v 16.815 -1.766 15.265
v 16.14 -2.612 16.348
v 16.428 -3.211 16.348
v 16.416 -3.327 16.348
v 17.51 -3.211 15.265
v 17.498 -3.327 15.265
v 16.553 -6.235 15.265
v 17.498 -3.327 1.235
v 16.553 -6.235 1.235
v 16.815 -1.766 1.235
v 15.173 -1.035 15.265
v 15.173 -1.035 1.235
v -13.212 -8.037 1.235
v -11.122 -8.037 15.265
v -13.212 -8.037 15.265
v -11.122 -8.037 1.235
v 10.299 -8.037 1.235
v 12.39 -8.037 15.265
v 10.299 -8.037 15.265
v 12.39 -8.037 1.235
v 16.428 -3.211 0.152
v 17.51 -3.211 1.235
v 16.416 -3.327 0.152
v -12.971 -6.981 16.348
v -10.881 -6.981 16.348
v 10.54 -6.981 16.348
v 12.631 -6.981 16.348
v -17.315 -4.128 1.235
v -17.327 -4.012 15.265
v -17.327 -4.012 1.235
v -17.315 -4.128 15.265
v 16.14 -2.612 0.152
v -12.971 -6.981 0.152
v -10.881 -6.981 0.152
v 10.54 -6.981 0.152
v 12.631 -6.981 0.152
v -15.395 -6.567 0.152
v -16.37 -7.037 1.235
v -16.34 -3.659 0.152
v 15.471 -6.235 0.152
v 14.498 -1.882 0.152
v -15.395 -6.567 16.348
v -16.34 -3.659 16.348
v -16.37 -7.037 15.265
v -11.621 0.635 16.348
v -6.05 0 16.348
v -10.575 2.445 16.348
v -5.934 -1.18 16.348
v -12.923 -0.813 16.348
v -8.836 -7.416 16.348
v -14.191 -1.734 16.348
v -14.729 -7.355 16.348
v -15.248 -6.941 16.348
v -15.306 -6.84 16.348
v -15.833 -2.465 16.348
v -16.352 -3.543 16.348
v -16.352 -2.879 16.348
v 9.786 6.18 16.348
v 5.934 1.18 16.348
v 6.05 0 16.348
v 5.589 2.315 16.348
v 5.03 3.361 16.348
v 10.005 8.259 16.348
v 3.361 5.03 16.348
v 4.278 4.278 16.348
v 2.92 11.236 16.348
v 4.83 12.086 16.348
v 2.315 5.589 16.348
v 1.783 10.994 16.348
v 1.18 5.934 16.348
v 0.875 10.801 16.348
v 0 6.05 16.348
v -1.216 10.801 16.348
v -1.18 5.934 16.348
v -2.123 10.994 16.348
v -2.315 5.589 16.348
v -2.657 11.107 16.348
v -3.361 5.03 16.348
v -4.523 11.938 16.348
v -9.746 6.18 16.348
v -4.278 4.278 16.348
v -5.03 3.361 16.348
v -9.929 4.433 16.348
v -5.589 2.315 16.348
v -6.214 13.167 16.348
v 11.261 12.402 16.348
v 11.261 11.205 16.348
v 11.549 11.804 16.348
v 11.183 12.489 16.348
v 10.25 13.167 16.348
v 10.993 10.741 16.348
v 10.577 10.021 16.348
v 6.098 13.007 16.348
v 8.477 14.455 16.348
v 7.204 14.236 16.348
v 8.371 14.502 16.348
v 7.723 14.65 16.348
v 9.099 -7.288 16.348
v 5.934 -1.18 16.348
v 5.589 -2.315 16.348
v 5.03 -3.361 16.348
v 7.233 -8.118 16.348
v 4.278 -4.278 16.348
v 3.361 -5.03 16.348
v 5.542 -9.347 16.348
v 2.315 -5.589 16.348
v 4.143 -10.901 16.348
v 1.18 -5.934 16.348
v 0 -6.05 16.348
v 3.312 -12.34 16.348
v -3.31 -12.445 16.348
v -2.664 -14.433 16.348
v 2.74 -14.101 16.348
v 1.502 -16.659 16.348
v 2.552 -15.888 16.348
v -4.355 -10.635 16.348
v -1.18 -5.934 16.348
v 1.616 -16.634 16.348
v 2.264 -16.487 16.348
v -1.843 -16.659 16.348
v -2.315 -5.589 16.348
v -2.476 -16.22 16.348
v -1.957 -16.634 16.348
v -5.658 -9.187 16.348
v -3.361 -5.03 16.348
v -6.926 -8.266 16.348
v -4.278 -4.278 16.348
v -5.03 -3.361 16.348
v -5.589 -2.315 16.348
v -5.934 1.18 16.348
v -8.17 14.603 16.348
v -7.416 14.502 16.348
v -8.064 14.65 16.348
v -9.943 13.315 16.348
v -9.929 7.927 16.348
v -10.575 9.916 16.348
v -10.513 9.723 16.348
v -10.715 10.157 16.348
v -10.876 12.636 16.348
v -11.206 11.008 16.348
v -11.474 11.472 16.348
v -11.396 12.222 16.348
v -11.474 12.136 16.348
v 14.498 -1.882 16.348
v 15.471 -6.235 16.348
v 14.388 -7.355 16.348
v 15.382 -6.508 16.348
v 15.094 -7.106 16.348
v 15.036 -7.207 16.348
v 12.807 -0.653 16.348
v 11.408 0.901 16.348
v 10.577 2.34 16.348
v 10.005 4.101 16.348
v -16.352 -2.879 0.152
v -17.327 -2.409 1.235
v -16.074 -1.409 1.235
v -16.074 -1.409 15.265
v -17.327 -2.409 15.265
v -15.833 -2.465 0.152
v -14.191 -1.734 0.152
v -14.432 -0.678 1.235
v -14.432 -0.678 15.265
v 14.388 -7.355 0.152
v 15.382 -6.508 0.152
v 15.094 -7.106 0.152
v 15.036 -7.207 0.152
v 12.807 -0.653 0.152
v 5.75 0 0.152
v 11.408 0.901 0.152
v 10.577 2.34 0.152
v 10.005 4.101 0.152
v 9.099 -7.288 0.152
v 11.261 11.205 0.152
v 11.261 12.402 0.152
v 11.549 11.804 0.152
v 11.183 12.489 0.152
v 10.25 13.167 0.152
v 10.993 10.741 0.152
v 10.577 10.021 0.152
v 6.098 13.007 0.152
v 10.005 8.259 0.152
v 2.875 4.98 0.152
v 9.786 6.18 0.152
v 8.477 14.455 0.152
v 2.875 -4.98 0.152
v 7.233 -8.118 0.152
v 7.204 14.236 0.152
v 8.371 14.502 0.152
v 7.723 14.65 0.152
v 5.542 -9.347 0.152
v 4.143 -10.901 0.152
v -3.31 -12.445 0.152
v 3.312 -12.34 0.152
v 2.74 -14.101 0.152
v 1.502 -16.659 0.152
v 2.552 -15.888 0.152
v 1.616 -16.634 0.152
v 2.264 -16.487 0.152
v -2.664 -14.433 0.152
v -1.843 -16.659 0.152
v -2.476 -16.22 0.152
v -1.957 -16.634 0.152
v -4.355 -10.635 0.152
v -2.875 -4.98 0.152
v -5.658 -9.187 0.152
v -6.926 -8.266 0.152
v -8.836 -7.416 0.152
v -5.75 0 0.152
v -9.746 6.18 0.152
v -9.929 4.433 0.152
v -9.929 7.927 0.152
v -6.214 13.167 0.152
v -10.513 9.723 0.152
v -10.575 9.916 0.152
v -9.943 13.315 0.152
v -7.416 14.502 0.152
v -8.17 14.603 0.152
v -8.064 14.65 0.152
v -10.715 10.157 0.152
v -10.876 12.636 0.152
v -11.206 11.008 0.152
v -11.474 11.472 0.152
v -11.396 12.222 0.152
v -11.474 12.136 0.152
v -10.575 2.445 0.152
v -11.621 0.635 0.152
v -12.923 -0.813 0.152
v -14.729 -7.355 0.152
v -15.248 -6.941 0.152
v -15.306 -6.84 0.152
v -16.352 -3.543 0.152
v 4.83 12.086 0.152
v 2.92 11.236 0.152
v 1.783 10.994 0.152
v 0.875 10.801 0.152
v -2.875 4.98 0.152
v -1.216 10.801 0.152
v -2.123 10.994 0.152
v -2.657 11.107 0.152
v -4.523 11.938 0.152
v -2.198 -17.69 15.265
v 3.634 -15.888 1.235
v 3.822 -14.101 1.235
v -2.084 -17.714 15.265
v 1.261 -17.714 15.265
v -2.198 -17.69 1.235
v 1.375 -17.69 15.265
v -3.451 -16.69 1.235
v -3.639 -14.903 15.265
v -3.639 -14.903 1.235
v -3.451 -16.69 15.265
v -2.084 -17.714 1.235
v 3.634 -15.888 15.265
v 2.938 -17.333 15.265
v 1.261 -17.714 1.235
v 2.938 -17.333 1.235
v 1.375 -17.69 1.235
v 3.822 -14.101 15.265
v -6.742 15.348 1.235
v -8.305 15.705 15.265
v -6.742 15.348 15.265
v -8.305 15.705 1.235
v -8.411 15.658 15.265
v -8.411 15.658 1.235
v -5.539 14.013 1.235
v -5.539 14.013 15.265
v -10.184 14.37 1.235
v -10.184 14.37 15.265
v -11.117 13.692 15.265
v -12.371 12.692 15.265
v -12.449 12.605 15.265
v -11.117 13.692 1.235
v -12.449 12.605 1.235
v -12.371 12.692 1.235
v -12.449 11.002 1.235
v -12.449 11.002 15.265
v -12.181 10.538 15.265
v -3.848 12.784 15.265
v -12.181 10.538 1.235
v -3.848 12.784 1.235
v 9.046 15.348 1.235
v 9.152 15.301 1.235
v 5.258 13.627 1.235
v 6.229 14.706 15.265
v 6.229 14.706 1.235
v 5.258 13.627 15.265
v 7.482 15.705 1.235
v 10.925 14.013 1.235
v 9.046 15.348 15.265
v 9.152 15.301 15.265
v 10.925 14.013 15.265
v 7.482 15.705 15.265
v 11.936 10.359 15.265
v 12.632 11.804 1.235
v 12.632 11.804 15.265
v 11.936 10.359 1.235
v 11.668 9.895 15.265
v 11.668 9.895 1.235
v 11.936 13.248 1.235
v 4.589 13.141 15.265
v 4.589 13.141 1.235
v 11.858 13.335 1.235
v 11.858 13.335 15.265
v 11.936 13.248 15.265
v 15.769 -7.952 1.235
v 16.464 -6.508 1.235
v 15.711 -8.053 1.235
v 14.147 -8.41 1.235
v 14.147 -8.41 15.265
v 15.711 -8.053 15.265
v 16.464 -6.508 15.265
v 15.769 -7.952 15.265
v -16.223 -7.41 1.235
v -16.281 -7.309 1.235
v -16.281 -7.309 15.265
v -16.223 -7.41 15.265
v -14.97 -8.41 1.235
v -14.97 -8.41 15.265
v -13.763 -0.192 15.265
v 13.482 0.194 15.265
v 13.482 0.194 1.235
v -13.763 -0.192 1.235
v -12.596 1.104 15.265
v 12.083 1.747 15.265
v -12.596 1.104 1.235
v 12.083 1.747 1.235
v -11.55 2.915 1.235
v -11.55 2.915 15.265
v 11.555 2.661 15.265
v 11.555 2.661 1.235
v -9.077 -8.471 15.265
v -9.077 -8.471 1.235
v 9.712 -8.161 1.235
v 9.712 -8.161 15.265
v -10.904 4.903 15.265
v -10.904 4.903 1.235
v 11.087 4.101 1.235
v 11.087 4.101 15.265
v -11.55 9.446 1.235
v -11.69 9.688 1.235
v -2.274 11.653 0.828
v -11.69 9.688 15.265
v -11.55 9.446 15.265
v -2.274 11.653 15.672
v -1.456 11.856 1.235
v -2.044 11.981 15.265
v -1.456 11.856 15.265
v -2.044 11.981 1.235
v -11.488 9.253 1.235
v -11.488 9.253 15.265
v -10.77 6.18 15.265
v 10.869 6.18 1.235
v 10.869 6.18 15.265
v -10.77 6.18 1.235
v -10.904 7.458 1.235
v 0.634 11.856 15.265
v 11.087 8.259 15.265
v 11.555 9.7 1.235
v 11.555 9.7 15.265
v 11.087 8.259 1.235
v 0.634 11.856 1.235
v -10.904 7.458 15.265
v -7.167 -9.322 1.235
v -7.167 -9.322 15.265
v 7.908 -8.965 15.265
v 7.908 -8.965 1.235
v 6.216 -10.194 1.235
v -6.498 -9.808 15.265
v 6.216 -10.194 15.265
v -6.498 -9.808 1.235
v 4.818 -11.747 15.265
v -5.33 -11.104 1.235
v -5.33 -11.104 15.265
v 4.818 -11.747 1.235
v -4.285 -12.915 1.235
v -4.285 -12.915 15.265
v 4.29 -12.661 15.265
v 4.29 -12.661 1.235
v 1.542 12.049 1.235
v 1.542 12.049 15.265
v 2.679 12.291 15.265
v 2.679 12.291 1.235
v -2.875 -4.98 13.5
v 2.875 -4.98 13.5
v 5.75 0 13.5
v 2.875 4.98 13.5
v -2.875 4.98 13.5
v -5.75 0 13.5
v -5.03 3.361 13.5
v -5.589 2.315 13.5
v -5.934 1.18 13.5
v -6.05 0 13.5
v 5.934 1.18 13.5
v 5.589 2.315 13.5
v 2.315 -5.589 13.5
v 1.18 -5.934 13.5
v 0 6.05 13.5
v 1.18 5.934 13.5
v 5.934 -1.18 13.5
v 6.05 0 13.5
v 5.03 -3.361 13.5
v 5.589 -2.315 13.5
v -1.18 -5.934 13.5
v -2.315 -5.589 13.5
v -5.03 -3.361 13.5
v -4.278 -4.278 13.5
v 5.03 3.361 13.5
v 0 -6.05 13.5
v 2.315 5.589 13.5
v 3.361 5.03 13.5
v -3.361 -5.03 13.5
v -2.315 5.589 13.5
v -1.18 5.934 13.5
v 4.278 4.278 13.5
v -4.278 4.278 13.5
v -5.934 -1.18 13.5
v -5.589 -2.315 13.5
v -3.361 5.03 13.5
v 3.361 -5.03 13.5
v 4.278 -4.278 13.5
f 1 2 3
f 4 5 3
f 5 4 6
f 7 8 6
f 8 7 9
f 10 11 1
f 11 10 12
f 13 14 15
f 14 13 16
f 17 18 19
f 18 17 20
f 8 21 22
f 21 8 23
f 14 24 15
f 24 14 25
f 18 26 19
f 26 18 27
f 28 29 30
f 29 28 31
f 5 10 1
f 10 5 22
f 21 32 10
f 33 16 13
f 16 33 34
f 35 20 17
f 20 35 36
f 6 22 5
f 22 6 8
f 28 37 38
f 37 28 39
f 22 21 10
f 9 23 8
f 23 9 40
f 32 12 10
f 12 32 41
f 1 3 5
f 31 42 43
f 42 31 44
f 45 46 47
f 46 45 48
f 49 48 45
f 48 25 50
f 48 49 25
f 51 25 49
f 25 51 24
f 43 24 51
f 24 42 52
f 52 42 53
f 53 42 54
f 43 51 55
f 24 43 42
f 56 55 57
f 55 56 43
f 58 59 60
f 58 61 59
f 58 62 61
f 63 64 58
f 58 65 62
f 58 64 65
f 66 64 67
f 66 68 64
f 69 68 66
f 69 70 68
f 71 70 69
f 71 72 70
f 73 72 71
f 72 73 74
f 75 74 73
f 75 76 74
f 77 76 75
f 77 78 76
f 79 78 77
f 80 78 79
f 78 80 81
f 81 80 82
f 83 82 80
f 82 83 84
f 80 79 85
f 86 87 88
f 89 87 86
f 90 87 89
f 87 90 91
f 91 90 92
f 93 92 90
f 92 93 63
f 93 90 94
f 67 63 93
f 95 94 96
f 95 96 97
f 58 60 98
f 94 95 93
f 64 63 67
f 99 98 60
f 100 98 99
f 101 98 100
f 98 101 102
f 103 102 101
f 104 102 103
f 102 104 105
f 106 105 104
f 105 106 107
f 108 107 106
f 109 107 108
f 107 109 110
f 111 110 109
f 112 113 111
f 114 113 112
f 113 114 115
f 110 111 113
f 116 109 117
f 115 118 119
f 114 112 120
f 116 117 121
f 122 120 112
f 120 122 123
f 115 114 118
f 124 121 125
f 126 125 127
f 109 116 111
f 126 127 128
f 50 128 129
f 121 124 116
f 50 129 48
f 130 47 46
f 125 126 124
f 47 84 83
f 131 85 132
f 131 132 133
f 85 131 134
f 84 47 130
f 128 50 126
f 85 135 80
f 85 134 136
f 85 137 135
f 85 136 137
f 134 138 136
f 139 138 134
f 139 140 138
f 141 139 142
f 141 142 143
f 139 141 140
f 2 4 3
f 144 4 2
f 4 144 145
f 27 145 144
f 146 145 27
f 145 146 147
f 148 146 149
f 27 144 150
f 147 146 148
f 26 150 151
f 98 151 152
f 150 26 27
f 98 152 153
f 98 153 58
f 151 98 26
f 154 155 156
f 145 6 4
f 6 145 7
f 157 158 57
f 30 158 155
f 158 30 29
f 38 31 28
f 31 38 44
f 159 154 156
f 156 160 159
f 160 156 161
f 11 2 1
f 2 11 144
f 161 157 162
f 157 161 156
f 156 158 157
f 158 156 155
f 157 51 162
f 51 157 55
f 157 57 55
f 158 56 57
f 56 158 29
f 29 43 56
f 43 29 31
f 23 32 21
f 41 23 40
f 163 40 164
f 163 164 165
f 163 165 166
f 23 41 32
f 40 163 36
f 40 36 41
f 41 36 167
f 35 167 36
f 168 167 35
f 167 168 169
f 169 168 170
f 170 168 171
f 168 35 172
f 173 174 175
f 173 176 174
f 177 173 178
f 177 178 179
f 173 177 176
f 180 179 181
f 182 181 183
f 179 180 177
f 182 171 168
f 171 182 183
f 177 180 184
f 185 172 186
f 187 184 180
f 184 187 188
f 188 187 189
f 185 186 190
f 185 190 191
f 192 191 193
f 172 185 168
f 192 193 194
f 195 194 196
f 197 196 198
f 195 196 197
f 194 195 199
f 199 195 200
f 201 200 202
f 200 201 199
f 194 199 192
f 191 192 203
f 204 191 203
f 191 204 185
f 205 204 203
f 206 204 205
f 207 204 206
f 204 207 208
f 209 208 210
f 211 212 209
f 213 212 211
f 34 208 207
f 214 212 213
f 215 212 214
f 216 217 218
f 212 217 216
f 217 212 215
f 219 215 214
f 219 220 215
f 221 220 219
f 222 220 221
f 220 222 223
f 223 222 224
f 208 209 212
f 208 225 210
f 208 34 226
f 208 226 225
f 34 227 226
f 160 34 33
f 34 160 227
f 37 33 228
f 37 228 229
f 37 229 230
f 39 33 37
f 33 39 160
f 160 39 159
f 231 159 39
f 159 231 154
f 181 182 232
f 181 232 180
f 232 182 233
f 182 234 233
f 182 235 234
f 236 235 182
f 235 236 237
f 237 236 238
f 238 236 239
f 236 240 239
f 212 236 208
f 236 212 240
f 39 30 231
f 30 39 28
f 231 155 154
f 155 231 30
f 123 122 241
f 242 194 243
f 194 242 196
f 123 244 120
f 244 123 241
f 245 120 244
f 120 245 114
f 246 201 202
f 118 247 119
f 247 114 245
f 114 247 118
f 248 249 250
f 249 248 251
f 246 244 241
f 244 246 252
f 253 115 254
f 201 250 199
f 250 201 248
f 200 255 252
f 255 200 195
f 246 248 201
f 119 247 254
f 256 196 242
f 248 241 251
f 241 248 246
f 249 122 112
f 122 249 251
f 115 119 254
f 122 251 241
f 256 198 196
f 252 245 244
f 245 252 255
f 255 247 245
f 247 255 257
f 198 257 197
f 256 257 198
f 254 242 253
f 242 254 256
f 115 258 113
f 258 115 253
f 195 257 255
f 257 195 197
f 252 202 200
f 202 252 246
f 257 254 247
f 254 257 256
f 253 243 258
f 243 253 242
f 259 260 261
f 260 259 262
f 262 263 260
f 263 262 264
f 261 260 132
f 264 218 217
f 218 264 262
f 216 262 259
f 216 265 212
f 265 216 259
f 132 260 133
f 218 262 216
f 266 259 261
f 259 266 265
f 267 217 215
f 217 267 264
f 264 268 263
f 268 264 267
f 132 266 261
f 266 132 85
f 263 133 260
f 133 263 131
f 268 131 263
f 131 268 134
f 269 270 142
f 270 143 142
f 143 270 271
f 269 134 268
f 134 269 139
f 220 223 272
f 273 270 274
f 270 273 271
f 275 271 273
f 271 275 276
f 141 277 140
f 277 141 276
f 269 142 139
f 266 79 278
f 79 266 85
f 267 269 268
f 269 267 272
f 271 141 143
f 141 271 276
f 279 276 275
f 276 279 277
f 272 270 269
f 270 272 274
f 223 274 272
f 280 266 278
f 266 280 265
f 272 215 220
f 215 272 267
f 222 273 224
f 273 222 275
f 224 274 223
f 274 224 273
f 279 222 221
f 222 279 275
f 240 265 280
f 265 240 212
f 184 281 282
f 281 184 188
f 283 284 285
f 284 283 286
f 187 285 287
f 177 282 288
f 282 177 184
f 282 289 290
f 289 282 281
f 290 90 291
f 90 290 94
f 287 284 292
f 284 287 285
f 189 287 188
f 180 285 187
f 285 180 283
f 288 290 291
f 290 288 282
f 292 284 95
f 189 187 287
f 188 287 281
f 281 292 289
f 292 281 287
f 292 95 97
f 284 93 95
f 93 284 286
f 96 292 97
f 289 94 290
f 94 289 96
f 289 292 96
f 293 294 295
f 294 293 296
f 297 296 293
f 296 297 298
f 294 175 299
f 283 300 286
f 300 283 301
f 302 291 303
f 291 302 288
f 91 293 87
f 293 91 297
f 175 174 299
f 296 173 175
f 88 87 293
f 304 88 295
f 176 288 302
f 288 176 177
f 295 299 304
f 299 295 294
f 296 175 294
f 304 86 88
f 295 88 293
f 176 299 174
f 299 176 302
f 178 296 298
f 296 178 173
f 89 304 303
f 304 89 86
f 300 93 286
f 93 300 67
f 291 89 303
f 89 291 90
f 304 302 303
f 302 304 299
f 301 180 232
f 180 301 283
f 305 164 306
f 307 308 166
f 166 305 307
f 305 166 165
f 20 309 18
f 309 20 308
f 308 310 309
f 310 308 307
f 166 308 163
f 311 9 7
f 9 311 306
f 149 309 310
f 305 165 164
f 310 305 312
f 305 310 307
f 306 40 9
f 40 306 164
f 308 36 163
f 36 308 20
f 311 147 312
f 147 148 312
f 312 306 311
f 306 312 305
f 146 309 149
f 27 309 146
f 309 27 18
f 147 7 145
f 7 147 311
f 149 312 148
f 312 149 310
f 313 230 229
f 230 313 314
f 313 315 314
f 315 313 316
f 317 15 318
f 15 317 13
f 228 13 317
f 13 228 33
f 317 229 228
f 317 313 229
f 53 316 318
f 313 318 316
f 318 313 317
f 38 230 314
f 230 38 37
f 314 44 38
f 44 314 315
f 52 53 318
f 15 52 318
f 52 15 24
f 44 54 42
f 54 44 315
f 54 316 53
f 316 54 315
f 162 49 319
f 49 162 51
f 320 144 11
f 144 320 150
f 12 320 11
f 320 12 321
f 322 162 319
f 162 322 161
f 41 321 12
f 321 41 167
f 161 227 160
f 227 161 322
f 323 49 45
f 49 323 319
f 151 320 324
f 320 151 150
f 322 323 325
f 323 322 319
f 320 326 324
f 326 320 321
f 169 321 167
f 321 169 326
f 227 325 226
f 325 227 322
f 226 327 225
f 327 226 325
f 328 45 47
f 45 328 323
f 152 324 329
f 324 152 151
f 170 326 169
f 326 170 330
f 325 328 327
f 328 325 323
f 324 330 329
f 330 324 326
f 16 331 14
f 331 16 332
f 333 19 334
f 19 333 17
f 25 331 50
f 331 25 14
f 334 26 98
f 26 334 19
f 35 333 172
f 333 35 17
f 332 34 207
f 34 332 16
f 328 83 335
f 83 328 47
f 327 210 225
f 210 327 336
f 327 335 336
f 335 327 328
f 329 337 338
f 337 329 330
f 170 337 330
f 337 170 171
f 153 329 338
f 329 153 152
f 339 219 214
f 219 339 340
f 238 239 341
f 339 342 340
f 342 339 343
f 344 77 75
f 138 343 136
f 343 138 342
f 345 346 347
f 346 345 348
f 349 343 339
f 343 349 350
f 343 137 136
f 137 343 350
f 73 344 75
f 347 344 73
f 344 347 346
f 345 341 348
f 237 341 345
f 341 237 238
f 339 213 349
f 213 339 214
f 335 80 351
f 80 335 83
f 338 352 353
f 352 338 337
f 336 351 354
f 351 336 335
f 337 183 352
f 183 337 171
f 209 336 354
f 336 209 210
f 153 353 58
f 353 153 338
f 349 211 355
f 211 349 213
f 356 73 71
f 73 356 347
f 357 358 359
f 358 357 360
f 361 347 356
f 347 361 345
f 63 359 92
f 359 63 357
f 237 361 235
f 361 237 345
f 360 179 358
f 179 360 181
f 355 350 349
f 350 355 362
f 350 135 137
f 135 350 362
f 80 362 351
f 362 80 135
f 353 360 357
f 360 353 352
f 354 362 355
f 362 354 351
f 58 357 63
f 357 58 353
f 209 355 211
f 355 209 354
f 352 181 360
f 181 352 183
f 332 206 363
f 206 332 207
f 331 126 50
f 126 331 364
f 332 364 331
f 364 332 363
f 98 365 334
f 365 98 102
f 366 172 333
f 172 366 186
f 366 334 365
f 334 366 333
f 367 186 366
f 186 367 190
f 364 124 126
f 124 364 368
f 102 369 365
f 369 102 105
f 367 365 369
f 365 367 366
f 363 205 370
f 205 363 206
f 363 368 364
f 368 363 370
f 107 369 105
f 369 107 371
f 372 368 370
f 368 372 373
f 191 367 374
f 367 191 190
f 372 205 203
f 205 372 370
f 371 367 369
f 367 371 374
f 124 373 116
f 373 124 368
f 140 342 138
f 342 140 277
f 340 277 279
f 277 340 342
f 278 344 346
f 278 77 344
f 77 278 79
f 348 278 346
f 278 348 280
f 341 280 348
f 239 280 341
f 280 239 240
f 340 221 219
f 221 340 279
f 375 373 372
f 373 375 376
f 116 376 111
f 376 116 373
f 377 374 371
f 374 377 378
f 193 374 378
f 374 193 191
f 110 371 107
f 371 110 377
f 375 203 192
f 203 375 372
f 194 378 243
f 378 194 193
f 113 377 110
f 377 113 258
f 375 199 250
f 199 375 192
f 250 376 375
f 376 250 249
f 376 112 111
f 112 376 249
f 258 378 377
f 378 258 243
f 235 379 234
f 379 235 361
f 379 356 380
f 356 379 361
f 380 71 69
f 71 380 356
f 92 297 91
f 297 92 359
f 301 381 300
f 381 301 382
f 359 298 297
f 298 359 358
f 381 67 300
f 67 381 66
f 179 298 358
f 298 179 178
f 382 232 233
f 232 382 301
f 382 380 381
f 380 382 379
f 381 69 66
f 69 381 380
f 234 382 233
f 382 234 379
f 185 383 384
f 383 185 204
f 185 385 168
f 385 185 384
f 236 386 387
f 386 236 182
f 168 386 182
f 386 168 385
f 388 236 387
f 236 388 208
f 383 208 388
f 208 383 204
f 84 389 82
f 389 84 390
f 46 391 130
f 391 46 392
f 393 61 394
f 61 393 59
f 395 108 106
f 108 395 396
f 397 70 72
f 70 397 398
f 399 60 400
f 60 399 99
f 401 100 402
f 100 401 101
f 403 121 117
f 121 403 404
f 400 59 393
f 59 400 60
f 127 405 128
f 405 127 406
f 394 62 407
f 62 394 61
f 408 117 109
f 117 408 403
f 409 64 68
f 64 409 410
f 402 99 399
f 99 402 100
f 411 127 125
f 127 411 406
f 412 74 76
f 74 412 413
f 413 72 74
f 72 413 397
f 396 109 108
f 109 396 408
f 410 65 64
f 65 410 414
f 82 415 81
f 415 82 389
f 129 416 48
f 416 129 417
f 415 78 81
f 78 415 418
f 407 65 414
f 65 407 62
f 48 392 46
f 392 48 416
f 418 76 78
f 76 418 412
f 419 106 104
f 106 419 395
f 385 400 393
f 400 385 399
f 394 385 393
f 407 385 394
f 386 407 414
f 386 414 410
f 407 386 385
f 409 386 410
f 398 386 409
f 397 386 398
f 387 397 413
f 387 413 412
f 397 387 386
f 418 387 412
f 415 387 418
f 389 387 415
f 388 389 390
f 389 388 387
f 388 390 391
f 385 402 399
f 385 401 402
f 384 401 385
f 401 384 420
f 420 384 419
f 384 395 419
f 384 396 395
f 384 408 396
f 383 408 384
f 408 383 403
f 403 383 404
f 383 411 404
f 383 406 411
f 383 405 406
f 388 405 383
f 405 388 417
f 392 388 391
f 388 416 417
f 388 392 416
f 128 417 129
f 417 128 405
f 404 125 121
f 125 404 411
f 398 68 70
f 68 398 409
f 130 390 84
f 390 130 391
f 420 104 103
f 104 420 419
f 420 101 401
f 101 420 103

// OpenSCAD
/*
* (c) Copyright 2016 So Make It Limited
*
* This program is free software: you can redistribute it and/or modify
* it under the terms of the GNU General Public License as published by
* the Free Software Foundation, either version 3 of the License, or
* (at your option) any later version.
*
* This program is distributed in the hope that it will be useful,
* but WITHOUT ANY WARRANTY; without even the implied warranty of
* MERCHANTABILITY or FITNESS FOR A PARTICULAR PURPOSE.  See the
* GNU General Public License for more details.
*
* You should have received a copy of the GNU General Public License
* along with this program.  If not, see <http://www.gnu.org/licenses/>.
*/

module wheel(h = 15, r = 30, cr = 10, rr = 1.5) {
  minkowski() {
    difference() {
      translate([0,0,rr]) cylinder(h=h-rr*2, r = r - rr*2);
      for (i = [0:4]) {
        rotate([0,0,i*360/5]) translate([0, r/2 + cr, 0]) {
          cylinder(r = cr, h = h*2);
        }
      }
    }
    sphere(r=rr);
  }
}

tolerance = 0.2;
h=16.5;
rr = 2;
knob_r = 20;
hex_r = 11.1/2+tolerance;
round_r = 11.7/2+tolerance;
difference() {
  wheel(r = knob_r, h = h, rr=2);
  cylinder(r = hex_r, h = h, $fn = 6);
  translate([0,0,h-3]) cylinder(r = round_r, h = 4, $fn = 32);
}
